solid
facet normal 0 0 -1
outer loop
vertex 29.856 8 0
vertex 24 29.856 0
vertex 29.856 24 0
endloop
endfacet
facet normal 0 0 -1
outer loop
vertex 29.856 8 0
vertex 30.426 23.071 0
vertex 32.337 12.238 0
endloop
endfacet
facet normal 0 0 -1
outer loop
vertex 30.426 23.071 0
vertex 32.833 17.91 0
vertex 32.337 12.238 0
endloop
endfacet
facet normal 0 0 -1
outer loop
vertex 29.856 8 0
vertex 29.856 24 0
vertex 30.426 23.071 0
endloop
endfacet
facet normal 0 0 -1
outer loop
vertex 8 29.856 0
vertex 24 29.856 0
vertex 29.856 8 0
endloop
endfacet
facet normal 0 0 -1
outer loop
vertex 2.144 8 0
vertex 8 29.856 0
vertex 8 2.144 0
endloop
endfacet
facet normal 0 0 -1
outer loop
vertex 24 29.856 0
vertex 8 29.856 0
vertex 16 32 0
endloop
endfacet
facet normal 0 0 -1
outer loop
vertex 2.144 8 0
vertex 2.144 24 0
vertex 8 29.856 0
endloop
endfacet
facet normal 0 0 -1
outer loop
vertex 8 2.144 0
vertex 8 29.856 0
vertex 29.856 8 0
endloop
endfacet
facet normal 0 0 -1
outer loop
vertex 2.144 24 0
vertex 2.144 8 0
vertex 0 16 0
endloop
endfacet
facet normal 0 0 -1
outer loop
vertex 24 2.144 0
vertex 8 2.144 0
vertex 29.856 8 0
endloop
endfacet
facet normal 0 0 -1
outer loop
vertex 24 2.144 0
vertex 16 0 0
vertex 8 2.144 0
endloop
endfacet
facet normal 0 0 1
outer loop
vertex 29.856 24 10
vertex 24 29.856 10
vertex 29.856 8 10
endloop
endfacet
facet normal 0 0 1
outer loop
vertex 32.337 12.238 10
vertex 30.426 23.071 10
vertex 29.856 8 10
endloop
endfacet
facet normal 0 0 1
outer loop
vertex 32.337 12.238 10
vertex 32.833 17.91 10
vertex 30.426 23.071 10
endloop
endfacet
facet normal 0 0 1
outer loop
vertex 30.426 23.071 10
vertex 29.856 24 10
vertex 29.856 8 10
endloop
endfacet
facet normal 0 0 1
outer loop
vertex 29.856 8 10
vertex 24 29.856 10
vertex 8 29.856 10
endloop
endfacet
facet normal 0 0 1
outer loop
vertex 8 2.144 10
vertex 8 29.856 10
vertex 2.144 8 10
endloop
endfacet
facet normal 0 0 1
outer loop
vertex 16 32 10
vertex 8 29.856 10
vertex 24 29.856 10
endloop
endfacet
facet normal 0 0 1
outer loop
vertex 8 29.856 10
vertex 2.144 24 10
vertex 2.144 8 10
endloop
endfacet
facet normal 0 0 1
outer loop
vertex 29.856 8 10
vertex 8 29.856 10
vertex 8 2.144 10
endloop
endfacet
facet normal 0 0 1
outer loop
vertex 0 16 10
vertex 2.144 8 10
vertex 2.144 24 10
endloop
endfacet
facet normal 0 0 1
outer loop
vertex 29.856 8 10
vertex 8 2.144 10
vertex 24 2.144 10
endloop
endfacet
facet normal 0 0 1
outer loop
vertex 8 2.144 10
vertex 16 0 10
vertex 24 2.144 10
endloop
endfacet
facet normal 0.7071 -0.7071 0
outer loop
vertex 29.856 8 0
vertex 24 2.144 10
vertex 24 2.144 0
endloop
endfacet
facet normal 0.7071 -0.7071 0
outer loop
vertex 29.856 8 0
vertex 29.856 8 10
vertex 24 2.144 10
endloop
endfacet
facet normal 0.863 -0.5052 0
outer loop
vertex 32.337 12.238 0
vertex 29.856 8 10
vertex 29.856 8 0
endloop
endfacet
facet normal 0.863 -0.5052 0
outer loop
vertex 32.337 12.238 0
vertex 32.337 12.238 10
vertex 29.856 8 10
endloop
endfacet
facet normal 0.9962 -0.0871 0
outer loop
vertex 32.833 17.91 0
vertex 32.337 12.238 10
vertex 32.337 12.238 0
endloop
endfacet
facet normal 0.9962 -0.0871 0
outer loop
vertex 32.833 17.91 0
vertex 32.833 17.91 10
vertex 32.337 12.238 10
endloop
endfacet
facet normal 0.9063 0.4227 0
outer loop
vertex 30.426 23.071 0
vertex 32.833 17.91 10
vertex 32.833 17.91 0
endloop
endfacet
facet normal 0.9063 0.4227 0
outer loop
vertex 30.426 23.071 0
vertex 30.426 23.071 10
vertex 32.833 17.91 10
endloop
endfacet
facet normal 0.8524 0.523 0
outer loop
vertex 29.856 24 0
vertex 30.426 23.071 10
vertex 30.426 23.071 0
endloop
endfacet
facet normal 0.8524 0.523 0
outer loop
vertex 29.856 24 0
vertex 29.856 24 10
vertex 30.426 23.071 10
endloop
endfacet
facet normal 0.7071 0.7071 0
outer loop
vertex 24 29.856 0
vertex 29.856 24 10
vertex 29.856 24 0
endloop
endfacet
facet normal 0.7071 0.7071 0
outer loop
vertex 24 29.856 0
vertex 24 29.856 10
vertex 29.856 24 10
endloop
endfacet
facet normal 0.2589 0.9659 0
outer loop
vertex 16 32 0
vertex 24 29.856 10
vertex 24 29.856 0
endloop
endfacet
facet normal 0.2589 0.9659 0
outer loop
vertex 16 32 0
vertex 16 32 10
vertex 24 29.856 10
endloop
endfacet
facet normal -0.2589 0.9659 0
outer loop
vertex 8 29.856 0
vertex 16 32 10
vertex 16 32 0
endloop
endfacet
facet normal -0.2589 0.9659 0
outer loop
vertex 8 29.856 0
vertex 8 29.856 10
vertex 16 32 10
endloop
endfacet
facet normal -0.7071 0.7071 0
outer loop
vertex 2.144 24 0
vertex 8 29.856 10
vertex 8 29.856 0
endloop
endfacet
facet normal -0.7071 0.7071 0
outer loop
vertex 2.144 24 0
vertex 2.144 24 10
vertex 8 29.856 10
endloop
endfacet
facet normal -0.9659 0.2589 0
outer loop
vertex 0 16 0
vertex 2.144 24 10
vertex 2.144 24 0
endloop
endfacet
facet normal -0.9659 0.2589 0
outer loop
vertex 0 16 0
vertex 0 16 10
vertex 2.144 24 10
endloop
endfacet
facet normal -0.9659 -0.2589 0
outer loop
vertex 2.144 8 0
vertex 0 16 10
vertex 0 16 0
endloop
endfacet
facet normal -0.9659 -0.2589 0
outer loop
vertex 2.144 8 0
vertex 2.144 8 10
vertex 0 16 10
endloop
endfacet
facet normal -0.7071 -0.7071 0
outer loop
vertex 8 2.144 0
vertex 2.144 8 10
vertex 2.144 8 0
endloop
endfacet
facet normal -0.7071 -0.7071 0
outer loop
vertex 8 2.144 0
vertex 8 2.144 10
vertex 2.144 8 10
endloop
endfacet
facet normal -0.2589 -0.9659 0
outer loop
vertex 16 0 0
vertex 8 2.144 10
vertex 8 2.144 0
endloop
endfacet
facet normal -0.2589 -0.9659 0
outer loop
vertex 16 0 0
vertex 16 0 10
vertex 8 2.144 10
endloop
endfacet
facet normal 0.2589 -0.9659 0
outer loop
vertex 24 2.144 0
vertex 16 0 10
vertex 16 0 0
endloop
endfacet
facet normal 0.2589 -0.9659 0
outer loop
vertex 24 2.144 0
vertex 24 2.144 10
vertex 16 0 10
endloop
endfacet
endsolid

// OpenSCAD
$fn = 32;

// ----------------------------------------------------------------------
// Eccentric disc: egg, 10 mm thick
// ----------------------------------------------------------------------

// --- parameters (mm) ---
profile_height = 10;      // extrusion height
profile_points = 14;      // points of the closed outline

profile = [[0, 16], [2.144, 8], [8, 2.144], [16, 0], [24, 2.144], [29.856, 8], [32.337, 12.238], [32.833, 17.91], [30.426, 23.071], [29.856, 24], [24, 29.856], [16, 32], [8, 29.856], [2.144, 24]];  // single closed polygon, 14 points, counter clockwise

// --- the one profile operation ---
linear_extrude(height = profile_height) polygon(points = profile);
